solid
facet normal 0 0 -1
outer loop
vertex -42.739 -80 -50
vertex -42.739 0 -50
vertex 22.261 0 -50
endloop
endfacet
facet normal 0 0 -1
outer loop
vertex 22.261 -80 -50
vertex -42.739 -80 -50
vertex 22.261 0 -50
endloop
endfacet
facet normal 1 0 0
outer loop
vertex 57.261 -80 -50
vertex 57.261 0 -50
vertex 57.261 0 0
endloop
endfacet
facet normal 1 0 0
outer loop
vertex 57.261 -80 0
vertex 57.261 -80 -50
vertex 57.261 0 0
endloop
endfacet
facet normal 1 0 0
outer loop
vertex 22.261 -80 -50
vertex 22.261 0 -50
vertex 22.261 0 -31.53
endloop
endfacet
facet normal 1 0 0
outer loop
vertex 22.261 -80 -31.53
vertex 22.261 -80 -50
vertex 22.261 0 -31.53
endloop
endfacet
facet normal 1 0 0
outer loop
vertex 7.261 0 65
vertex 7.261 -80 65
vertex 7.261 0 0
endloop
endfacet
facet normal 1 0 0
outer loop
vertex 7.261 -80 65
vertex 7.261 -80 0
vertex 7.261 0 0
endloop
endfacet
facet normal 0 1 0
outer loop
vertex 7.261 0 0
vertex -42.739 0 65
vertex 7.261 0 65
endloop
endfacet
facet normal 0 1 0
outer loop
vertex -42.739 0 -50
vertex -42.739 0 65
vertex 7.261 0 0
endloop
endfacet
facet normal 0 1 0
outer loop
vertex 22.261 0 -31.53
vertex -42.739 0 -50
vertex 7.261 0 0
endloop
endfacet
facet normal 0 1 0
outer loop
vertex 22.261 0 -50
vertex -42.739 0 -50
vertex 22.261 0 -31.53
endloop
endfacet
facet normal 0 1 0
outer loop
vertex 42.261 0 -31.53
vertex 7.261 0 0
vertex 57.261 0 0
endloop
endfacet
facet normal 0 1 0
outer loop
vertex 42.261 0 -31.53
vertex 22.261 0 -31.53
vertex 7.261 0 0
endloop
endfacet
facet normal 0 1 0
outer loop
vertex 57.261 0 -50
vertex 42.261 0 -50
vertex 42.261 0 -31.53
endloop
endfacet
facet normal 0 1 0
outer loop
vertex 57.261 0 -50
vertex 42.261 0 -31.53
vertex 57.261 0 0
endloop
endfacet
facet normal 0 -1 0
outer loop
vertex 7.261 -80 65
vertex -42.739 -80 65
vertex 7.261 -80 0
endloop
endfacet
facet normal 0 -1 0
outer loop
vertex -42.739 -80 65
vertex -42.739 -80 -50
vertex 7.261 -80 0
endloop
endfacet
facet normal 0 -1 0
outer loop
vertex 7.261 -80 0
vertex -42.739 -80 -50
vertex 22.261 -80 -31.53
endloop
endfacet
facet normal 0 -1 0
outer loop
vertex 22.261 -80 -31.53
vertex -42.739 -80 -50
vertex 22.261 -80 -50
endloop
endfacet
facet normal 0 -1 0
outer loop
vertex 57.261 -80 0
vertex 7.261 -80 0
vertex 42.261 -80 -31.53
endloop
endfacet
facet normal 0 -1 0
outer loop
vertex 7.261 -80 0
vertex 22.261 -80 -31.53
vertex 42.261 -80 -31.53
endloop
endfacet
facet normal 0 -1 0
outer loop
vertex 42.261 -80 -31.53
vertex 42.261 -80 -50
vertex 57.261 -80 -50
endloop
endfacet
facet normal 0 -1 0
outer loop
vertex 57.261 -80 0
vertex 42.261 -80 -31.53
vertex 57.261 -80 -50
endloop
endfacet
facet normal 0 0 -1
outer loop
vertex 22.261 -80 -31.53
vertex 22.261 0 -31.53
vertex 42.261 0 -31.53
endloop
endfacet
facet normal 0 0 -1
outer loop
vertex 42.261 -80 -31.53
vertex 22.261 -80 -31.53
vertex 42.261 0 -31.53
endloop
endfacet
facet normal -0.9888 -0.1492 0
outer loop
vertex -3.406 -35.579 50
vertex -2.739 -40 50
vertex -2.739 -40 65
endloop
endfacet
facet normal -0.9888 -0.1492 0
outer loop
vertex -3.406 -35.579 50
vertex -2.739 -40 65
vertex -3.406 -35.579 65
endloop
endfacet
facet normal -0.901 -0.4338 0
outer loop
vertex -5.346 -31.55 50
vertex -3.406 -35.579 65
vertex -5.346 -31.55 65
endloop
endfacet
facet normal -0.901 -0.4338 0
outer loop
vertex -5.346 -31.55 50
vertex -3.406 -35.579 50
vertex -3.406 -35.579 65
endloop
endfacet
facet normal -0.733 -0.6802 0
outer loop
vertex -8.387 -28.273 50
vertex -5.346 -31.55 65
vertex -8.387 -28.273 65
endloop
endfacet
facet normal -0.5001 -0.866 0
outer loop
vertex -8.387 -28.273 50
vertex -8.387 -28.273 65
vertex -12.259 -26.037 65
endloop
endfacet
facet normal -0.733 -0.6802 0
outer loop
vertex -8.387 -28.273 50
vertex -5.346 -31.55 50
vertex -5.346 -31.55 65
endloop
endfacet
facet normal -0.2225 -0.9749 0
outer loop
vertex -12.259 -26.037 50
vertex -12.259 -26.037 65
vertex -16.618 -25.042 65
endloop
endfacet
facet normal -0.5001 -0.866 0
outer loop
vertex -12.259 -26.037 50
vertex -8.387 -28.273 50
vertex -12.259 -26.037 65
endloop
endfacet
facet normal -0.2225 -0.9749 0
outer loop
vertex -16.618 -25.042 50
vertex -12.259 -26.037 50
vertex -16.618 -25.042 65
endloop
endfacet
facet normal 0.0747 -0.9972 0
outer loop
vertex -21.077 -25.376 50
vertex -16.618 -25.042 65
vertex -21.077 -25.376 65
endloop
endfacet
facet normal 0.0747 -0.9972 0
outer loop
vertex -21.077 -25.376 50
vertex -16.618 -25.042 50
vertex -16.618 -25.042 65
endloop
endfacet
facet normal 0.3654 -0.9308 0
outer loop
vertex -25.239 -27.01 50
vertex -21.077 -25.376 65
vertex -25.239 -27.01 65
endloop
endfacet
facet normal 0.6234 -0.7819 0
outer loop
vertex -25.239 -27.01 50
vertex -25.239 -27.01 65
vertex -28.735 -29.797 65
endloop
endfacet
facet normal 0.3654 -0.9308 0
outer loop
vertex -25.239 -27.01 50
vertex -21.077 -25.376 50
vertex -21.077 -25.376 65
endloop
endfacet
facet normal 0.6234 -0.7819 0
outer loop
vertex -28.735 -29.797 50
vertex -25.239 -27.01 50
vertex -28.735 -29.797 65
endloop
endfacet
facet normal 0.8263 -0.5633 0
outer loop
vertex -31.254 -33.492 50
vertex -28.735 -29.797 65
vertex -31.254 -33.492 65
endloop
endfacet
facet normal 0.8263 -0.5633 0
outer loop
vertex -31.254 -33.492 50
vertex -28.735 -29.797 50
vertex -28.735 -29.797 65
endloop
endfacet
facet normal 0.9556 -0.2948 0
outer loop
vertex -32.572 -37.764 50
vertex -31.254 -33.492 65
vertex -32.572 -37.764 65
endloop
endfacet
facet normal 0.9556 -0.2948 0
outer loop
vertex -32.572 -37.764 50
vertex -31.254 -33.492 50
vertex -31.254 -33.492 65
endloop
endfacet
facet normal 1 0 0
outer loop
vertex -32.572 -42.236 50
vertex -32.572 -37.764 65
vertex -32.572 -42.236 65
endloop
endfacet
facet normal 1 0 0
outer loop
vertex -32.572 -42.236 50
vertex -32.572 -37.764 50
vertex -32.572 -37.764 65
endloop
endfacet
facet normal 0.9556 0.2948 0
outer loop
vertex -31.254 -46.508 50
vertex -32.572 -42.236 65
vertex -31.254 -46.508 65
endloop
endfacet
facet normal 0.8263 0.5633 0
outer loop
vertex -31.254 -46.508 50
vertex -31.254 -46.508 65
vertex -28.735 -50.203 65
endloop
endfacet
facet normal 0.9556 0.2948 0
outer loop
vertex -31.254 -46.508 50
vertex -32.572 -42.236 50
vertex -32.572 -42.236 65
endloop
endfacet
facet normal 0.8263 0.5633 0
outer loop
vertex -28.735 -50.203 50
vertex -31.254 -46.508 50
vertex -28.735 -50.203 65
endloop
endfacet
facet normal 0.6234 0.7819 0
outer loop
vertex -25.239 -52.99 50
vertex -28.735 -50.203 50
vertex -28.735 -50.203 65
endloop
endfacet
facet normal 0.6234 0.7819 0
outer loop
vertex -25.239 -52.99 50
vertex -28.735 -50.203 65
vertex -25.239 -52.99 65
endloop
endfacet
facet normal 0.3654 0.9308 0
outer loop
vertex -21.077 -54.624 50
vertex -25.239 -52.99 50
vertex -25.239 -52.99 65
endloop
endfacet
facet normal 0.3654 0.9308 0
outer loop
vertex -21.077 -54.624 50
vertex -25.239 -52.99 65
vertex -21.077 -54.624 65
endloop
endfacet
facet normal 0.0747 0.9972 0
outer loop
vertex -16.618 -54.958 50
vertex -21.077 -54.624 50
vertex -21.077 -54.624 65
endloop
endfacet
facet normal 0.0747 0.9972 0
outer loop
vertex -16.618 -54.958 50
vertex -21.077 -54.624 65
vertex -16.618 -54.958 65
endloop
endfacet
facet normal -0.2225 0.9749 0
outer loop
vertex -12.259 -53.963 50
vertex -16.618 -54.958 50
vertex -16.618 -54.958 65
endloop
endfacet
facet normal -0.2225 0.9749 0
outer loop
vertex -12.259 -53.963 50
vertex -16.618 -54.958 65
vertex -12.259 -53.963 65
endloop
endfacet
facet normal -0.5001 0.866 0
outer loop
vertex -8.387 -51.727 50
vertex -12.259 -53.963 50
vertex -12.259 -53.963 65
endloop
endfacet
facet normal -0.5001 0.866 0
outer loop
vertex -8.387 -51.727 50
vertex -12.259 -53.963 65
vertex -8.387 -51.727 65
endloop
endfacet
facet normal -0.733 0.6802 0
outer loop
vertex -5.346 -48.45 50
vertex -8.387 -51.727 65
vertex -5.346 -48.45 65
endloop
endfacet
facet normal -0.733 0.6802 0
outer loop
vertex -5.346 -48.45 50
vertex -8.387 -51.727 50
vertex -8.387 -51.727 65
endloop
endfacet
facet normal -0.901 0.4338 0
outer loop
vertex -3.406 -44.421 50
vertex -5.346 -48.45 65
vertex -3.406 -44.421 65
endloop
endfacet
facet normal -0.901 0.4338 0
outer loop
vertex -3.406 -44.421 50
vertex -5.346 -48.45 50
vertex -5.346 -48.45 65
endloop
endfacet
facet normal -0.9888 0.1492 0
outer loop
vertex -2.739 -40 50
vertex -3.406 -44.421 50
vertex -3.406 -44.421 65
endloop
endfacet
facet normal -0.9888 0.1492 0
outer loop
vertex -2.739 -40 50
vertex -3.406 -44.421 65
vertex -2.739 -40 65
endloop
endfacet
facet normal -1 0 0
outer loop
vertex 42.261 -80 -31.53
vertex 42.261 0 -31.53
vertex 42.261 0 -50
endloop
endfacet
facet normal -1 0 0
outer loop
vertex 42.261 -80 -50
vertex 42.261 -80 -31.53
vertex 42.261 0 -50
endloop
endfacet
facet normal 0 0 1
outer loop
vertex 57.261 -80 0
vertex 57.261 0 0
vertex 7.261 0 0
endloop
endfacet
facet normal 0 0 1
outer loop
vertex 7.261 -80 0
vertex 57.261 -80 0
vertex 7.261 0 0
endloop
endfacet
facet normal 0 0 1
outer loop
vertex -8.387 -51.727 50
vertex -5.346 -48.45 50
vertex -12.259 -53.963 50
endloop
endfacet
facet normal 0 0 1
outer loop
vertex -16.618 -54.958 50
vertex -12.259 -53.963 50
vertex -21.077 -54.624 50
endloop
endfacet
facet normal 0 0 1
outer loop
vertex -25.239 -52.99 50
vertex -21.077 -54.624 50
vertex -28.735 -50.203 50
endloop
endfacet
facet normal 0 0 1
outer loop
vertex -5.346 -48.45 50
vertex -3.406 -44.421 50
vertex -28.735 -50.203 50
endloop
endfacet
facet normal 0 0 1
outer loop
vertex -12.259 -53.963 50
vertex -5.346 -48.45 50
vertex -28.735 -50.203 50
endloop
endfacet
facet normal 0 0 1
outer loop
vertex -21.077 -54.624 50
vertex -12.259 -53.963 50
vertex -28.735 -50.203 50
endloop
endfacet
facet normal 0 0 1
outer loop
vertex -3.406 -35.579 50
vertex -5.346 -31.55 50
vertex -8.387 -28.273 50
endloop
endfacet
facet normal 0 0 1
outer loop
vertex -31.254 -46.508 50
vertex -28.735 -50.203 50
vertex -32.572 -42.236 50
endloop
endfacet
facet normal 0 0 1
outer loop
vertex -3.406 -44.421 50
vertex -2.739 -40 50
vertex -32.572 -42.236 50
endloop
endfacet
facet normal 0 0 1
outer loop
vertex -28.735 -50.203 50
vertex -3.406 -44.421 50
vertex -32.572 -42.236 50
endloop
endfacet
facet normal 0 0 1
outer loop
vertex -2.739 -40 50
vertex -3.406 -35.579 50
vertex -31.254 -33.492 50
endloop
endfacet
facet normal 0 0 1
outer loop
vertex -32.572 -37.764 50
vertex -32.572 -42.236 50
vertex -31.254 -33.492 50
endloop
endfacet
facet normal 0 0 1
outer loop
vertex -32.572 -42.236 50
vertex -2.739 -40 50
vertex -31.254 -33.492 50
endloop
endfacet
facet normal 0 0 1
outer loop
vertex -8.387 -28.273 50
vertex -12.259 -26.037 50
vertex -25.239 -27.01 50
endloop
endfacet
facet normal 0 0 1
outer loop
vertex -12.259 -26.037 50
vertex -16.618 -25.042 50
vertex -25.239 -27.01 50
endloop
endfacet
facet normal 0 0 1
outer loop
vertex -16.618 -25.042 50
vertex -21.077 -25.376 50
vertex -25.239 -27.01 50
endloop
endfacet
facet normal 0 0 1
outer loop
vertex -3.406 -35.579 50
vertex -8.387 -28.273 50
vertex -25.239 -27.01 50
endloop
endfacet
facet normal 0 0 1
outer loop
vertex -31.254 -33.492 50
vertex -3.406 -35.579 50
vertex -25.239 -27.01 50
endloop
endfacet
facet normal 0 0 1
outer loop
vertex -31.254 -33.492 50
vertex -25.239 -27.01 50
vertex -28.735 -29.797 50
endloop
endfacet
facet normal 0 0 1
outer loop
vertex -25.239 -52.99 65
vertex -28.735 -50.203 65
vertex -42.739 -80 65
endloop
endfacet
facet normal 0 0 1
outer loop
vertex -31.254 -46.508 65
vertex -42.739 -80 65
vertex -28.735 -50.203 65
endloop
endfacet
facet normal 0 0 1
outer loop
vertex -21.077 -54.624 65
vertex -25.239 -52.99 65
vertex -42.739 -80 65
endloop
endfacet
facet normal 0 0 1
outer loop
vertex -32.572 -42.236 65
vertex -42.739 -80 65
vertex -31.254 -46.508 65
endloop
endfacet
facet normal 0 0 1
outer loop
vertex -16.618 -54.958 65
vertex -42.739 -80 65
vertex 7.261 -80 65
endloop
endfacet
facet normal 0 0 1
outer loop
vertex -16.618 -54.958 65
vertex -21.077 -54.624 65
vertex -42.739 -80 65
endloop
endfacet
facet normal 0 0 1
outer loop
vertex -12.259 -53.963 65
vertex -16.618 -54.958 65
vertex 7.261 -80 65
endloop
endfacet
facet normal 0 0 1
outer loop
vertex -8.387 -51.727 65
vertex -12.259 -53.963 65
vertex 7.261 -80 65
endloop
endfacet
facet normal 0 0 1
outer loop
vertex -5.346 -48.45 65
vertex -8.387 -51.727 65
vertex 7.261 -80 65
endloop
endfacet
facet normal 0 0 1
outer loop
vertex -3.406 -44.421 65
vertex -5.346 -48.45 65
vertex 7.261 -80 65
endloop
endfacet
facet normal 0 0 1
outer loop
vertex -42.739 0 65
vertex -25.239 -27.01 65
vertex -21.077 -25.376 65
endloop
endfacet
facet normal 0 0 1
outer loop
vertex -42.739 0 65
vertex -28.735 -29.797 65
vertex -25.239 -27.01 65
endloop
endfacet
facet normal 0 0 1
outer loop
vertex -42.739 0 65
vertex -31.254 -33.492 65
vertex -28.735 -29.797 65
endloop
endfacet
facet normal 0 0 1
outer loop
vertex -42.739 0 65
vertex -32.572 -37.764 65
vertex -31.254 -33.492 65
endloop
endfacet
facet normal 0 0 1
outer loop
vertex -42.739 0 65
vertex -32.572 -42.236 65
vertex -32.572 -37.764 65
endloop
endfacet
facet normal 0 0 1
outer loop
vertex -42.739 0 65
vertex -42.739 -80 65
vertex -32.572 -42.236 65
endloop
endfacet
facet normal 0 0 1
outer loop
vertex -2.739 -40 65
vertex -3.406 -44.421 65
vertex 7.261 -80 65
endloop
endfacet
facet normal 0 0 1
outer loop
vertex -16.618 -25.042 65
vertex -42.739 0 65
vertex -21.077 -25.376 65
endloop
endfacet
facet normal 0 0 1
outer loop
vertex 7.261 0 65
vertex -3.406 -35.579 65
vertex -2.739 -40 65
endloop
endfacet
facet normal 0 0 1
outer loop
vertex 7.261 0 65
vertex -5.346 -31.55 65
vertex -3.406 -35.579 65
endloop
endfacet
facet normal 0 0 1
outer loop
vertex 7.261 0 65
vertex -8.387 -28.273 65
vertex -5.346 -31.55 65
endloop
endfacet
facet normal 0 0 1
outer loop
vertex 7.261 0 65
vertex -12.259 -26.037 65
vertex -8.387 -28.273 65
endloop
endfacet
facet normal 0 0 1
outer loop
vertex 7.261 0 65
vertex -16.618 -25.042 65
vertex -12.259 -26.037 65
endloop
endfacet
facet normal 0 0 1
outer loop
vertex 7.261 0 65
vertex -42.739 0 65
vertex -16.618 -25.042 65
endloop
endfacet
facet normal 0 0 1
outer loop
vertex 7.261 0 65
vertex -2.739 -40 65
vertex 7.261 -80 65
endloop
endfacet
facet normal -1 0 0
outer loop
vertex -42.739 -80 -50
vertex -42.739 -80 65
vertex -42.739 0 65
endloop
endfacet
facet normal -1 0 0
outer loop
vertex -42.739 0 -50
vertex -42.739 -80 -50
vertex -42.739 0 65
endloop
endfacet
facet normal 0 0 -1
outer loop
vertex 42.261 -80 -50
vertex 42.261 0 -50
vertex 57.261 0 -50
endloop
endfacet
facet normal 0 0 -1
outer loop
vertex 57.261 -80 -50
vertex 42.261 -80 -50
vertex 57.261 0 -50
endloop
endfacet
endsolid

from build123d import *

# Parameters (mm, degrees)
F1_DEPTH = 80
F2_W     = 50
F2_H     = 80
F2_R     = 15
F3_DEPTH = 15


with BuildPart() as f1:
    # F0 (on Front) → F1 (new body)
    with BuildSketch(Plane.XZ):
        Polygon((7.260843, 50), (-42.739157, 50), (-42.739157, -50), (22.260843, -50), (22.260843, -31.529605), (42.260843, -31.529605), (42.260843, -50), (57.260843, -50), (57.260843, 0), (7.260843, 0), align=None)
    extrude(amount=F1_DEPTH)

    # F2 (on face) → F3 (join)
    with BuildSketch(Plane.XY.offset(50)):
        with Locations((-17.739157, -40)):
            Rectangle(F2_W, F2_H)
        with Locations((-17.739157, -40)):
            Circle(F2_R, mode=Mode.SUBTRACT)
    extrude(amount=F3_DEPTH)


solid = f1.part
